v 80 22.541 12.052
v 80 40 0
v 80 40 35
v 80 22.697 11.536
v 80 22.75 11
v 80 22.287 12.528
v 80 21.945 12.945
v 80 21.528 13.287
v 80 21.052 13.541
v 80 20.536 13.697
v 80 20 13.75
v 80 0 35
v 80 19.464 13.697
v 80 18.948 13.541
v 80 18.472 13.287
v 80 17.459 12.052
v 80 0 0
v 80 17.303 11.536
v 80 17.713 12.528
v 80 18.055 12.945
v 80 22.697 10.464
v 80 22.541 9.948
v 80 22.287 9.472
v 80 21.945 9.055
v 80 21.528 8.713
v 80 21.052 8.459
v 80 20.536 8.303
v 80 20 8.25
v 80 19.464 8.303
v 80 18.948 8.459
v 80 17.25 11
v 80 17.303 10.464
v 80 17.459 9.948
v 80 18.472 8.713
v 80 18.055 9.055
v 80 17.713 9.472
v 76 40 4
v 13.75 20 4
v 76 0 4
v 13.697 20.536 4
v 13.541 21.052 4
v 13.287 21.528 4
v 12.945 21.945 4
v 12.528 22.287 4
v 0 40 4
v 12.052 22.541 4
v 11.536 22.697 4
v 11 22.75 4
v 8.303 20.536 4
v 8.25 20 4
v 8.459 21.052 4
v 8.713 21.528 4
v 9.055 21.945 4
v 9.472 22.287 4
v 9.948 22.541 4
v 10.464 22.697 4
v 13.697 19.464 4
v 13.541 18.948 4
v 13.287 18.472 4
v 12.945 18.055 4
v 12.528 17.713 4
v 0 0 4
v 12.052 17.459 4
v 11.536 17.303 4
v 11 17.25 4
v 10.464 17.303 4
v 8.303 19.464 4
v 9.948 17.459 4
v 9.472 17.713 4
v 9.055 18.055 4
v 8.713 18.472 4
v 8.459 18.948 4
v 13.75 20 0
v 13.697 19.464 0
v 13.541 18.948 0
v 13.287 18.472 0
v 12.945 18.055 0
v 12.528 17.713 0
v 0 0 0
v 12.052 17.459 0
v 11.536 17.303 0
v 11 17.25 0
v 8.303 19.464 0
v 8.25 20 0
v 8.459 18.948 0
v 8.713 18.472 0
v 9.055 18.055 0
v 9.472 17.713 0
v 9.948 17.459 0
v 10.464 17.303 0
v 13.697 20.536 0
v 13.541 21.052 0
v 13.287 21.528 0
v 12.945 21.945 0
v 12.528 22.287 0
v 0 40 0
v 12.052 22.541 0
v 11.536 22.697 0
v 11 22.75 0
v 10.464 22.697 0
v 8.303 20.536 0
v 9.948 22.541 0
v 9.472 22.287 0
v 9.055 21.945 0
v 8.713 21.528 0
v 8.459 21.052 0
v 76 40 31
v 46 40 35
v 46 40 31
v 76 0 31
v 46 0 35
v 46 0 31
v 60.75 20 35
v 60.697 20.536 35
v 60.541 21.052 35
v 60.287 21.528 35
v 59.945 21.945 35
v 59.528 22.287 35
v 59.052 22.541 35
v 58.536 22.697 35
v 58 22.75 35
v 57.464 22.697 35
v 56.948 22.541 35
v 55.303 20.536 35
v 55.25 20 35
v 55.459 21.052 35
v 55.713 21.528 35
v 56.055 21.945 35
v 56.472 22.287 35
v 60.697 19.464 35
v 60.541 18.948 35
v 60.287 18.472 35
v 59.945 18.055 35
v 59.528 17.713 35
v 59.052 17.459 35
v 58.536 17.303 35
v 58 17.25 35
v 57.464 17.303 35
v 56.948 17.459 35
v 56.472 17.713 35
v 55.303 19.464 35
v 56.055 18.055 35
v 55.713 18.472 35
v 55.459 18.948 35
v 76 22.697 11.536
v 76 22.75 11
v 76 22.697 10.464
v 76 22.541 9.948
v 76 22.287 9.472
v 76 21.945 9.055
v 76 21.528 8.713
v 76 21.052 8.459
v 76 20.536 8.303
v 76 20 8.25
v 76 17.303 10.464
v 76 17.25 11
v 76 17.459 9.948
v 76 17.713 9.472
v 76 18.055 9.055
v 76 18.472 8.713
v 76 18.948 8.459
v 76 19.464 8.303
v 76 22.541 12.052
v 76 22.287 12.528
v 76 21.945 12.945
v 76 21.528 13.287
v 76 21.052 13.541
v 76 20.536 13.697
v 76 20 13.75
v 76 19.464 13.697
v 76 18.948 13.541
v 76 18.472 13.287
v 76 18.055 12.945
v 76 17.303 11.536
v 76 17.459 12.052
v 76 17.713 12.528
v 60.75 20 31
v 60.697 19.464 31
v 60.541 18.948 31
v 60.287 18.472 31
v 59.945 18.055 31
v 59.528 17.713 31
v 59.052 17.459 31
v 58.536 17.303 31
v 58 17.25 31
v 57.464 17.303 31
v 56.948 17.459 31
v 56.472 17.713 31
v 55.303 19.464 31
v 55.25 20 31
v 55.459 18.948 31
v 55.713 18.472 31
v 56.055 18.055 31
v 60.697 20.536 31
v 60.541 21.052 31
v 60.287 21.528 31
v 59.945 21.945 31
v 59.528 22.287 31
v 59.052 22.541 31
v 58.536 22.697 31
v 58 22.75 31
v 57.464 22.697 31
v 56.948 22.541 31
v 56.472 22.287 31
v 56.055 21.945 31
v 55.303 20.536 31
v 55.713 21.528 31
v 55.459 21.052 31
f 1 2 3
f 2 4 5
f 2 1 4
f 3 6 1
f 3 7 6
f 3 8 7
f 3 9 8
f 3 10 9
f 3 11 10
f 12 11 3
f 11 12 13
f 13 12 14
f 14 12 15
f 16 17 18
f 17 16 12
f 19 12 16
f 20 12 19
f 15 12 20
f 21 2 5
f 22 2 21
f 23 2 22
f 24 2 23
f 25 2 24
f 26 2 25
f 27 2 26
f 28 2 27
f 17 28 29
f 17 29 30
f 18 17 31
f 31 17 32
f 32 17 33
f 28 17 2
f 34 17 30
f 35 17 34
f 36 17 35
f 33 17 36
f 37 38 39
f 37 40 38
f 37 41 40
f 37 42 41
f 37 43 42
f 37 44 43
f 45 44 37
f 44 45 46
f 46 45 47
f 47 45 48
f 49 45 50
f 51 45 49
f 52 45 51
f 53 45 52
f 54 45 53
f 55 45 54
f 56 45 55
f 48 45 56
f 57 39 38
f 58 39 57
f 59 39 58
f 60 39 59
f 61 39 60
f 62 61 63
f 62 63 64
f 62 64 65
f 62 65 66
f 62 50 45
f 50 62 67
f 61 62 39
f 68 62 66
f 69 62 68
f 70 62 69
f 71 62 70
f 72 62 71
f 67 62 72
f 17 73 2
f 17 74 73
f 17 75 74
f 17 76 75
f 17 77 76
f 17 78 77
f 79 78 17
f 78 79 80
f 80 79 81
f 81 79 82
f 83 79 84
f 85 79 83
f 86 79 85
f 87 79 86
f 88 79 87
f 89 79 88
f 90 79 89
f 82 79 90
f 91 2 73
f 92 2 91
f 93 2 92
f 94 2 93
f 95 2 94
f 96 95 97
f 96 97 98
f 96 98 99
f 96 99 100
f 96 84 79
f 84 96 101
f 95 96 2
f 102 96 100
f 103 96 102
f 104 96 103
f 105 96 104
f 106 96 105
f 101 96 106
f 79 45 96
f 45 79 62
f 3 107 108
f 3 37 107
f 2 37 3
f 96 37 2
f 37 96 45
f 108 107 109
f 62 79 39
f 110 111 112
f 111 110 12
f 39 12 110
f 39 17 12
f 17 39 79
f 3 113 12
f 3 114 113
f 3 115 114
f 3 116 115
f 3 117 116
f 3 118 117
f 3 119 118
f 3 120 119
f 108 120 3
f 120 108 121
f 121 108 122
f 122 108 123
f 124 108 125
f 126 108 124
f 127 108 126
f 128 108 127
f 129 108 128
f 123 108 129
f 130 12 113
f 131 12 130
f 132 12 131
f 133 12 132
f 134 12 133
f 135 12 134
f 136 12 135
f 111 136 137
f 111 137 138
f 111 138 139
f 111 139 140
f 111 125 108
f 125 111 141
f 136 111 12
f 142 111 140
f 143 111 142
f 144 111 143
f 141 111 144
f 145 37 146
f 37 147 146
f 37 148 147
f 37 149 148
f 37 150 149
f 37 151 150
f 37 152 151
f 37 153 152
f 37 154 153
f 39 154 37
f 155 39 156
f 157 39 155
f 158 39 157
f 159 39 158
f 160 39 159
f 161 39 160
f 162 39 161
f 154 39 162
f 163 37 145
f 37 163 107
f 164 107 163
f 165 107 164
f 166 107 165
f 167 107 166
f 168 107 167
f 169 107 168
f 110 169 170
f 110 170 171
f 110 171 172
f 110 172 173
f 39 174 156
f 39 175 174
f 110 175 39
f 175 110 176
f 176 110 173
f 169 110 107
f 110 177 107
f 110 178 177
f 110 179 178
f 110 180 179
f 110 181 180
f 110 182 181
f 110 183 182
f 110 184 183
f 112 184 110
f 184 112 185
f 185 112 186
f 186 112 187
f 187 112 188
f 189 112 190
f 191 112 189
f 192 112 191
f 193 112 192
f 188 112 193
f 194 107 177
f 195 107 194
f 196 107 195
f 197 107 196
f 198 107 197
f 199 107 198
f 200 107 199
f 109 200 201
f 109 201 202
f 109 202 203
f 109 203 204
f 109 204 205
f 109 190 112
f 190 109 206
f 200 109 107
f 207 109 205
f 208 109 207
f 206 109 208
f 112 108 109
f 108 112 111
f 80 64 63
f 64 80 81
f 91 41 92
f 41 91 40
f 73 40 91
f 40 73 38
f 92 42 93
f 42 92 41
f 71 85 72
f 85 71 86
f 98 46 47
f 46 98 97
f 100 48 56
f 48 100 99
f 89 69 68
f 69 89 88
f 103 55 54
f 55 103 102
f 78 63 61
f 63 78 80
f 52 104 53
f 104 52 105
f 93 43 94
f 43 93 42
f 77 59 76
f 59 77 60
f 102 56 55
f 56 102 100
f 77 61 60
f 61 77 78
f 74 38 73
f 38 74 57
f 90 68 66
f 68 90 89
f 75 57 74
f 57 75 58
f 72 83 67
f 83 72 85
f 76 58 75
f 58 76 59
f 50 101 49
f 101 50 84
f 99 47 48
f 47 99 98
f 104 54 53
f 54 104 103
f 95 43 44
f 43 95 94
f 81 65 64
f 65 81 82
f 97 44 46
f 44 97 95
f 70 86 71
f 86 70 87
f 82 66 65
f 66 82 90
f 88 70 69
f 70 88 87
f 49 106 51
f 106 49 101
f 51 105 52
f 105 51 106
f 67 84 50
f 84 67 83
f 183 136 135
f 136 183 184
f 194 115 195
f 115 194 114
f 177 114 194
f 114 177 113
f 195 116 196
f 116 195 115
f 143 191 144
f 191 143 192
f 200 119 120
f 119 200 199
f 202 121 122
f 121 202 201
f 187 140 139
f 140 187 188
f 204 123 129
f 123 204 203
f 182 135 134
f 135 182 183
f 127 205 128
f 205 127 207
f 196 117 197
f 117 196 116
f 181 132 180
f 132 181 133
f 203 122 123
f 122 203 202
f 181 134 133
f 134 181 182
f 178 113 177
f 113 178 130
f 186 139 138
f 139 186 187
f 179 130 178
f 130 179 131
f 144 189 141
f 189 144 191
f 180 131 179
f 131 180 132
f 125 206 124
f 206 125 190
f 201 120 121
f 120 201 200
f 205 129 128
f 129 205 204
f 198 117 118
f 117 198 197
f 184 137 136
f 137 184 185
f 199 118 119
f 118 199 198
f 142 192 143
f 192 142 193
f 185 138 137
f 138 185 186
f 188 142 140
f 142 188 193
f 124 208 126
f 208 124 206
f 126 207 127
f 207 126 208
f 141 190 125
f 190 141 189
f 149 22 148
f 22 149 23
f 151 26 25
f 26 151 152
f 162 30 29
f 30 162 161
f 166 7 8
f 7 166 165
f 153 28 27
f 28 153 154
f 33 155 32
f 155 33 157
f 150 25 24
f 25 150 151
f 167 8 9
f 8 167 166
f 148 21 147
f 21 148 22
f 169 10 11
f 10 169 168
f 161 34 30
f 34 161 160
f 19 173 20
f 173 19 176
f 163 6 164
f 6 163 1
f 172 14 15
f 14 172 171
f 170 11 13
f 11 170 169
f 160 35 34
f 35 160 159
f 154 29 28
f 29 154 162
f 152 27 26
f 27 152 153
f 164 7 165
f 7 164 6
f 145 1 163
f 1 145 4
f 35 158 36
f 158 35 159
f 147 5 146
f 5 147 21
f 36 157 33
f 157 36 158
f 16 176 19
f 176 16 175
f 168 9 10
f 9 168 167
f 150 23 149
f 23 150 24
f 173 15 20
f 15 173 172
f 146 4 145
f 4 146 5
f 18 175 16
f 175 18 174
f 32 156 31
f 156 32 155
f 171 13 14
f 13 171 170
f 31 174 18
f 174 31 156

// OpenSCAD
$fn = 32;

// ----------------------------------------------------------------------
// Z-bracket: 80 x 40 x 35 mm
// ----------------------------------------------------------------------

// --- parameters (mm) ---
foot_len = 80;            // lower foot length, X
top_len = 30;             // upper foot length, X
depth = 40;               // bracket width, Y
step_h = 35;              // overall rise, Z
plate_t = 4;              // plate thickness
hole_d = 5.5;             // clearance for M5

module hole_z(px, py, z0) {
  translate([px, py, z0 - 0.5]) cylinder(h = plate_t + 1, d = hole_d);
}
module hole_x(py, pz) {
  translate([-0.5, py, pz]) rotate([0, 90, 0]) cylinder(h = plate_t + 1, d = hole_d);
}

difference() {
  union() {
    cube([foot_len, depth, plate_t]);
    /* web, overlapping the lower foot */
    translate([foot_len - plate_t, 0, 0]) cube([plate_t, depth, step_h]);
    /* upper foot, sunk into the web */
    translate([foot_len - plate_t - top_len, 0, step_h - plate_t]) cube([top_len + plate_t, depth, plate_t]);
  }
  hole_z(11, 20, 0);
  translate([foot_len - plate_t - 18, 0, 0]) hole_z(0, 20, step_h - plate_t);
  translate([foot_len - plate_t, 0, 0]) hole_x(20, 11);
}
